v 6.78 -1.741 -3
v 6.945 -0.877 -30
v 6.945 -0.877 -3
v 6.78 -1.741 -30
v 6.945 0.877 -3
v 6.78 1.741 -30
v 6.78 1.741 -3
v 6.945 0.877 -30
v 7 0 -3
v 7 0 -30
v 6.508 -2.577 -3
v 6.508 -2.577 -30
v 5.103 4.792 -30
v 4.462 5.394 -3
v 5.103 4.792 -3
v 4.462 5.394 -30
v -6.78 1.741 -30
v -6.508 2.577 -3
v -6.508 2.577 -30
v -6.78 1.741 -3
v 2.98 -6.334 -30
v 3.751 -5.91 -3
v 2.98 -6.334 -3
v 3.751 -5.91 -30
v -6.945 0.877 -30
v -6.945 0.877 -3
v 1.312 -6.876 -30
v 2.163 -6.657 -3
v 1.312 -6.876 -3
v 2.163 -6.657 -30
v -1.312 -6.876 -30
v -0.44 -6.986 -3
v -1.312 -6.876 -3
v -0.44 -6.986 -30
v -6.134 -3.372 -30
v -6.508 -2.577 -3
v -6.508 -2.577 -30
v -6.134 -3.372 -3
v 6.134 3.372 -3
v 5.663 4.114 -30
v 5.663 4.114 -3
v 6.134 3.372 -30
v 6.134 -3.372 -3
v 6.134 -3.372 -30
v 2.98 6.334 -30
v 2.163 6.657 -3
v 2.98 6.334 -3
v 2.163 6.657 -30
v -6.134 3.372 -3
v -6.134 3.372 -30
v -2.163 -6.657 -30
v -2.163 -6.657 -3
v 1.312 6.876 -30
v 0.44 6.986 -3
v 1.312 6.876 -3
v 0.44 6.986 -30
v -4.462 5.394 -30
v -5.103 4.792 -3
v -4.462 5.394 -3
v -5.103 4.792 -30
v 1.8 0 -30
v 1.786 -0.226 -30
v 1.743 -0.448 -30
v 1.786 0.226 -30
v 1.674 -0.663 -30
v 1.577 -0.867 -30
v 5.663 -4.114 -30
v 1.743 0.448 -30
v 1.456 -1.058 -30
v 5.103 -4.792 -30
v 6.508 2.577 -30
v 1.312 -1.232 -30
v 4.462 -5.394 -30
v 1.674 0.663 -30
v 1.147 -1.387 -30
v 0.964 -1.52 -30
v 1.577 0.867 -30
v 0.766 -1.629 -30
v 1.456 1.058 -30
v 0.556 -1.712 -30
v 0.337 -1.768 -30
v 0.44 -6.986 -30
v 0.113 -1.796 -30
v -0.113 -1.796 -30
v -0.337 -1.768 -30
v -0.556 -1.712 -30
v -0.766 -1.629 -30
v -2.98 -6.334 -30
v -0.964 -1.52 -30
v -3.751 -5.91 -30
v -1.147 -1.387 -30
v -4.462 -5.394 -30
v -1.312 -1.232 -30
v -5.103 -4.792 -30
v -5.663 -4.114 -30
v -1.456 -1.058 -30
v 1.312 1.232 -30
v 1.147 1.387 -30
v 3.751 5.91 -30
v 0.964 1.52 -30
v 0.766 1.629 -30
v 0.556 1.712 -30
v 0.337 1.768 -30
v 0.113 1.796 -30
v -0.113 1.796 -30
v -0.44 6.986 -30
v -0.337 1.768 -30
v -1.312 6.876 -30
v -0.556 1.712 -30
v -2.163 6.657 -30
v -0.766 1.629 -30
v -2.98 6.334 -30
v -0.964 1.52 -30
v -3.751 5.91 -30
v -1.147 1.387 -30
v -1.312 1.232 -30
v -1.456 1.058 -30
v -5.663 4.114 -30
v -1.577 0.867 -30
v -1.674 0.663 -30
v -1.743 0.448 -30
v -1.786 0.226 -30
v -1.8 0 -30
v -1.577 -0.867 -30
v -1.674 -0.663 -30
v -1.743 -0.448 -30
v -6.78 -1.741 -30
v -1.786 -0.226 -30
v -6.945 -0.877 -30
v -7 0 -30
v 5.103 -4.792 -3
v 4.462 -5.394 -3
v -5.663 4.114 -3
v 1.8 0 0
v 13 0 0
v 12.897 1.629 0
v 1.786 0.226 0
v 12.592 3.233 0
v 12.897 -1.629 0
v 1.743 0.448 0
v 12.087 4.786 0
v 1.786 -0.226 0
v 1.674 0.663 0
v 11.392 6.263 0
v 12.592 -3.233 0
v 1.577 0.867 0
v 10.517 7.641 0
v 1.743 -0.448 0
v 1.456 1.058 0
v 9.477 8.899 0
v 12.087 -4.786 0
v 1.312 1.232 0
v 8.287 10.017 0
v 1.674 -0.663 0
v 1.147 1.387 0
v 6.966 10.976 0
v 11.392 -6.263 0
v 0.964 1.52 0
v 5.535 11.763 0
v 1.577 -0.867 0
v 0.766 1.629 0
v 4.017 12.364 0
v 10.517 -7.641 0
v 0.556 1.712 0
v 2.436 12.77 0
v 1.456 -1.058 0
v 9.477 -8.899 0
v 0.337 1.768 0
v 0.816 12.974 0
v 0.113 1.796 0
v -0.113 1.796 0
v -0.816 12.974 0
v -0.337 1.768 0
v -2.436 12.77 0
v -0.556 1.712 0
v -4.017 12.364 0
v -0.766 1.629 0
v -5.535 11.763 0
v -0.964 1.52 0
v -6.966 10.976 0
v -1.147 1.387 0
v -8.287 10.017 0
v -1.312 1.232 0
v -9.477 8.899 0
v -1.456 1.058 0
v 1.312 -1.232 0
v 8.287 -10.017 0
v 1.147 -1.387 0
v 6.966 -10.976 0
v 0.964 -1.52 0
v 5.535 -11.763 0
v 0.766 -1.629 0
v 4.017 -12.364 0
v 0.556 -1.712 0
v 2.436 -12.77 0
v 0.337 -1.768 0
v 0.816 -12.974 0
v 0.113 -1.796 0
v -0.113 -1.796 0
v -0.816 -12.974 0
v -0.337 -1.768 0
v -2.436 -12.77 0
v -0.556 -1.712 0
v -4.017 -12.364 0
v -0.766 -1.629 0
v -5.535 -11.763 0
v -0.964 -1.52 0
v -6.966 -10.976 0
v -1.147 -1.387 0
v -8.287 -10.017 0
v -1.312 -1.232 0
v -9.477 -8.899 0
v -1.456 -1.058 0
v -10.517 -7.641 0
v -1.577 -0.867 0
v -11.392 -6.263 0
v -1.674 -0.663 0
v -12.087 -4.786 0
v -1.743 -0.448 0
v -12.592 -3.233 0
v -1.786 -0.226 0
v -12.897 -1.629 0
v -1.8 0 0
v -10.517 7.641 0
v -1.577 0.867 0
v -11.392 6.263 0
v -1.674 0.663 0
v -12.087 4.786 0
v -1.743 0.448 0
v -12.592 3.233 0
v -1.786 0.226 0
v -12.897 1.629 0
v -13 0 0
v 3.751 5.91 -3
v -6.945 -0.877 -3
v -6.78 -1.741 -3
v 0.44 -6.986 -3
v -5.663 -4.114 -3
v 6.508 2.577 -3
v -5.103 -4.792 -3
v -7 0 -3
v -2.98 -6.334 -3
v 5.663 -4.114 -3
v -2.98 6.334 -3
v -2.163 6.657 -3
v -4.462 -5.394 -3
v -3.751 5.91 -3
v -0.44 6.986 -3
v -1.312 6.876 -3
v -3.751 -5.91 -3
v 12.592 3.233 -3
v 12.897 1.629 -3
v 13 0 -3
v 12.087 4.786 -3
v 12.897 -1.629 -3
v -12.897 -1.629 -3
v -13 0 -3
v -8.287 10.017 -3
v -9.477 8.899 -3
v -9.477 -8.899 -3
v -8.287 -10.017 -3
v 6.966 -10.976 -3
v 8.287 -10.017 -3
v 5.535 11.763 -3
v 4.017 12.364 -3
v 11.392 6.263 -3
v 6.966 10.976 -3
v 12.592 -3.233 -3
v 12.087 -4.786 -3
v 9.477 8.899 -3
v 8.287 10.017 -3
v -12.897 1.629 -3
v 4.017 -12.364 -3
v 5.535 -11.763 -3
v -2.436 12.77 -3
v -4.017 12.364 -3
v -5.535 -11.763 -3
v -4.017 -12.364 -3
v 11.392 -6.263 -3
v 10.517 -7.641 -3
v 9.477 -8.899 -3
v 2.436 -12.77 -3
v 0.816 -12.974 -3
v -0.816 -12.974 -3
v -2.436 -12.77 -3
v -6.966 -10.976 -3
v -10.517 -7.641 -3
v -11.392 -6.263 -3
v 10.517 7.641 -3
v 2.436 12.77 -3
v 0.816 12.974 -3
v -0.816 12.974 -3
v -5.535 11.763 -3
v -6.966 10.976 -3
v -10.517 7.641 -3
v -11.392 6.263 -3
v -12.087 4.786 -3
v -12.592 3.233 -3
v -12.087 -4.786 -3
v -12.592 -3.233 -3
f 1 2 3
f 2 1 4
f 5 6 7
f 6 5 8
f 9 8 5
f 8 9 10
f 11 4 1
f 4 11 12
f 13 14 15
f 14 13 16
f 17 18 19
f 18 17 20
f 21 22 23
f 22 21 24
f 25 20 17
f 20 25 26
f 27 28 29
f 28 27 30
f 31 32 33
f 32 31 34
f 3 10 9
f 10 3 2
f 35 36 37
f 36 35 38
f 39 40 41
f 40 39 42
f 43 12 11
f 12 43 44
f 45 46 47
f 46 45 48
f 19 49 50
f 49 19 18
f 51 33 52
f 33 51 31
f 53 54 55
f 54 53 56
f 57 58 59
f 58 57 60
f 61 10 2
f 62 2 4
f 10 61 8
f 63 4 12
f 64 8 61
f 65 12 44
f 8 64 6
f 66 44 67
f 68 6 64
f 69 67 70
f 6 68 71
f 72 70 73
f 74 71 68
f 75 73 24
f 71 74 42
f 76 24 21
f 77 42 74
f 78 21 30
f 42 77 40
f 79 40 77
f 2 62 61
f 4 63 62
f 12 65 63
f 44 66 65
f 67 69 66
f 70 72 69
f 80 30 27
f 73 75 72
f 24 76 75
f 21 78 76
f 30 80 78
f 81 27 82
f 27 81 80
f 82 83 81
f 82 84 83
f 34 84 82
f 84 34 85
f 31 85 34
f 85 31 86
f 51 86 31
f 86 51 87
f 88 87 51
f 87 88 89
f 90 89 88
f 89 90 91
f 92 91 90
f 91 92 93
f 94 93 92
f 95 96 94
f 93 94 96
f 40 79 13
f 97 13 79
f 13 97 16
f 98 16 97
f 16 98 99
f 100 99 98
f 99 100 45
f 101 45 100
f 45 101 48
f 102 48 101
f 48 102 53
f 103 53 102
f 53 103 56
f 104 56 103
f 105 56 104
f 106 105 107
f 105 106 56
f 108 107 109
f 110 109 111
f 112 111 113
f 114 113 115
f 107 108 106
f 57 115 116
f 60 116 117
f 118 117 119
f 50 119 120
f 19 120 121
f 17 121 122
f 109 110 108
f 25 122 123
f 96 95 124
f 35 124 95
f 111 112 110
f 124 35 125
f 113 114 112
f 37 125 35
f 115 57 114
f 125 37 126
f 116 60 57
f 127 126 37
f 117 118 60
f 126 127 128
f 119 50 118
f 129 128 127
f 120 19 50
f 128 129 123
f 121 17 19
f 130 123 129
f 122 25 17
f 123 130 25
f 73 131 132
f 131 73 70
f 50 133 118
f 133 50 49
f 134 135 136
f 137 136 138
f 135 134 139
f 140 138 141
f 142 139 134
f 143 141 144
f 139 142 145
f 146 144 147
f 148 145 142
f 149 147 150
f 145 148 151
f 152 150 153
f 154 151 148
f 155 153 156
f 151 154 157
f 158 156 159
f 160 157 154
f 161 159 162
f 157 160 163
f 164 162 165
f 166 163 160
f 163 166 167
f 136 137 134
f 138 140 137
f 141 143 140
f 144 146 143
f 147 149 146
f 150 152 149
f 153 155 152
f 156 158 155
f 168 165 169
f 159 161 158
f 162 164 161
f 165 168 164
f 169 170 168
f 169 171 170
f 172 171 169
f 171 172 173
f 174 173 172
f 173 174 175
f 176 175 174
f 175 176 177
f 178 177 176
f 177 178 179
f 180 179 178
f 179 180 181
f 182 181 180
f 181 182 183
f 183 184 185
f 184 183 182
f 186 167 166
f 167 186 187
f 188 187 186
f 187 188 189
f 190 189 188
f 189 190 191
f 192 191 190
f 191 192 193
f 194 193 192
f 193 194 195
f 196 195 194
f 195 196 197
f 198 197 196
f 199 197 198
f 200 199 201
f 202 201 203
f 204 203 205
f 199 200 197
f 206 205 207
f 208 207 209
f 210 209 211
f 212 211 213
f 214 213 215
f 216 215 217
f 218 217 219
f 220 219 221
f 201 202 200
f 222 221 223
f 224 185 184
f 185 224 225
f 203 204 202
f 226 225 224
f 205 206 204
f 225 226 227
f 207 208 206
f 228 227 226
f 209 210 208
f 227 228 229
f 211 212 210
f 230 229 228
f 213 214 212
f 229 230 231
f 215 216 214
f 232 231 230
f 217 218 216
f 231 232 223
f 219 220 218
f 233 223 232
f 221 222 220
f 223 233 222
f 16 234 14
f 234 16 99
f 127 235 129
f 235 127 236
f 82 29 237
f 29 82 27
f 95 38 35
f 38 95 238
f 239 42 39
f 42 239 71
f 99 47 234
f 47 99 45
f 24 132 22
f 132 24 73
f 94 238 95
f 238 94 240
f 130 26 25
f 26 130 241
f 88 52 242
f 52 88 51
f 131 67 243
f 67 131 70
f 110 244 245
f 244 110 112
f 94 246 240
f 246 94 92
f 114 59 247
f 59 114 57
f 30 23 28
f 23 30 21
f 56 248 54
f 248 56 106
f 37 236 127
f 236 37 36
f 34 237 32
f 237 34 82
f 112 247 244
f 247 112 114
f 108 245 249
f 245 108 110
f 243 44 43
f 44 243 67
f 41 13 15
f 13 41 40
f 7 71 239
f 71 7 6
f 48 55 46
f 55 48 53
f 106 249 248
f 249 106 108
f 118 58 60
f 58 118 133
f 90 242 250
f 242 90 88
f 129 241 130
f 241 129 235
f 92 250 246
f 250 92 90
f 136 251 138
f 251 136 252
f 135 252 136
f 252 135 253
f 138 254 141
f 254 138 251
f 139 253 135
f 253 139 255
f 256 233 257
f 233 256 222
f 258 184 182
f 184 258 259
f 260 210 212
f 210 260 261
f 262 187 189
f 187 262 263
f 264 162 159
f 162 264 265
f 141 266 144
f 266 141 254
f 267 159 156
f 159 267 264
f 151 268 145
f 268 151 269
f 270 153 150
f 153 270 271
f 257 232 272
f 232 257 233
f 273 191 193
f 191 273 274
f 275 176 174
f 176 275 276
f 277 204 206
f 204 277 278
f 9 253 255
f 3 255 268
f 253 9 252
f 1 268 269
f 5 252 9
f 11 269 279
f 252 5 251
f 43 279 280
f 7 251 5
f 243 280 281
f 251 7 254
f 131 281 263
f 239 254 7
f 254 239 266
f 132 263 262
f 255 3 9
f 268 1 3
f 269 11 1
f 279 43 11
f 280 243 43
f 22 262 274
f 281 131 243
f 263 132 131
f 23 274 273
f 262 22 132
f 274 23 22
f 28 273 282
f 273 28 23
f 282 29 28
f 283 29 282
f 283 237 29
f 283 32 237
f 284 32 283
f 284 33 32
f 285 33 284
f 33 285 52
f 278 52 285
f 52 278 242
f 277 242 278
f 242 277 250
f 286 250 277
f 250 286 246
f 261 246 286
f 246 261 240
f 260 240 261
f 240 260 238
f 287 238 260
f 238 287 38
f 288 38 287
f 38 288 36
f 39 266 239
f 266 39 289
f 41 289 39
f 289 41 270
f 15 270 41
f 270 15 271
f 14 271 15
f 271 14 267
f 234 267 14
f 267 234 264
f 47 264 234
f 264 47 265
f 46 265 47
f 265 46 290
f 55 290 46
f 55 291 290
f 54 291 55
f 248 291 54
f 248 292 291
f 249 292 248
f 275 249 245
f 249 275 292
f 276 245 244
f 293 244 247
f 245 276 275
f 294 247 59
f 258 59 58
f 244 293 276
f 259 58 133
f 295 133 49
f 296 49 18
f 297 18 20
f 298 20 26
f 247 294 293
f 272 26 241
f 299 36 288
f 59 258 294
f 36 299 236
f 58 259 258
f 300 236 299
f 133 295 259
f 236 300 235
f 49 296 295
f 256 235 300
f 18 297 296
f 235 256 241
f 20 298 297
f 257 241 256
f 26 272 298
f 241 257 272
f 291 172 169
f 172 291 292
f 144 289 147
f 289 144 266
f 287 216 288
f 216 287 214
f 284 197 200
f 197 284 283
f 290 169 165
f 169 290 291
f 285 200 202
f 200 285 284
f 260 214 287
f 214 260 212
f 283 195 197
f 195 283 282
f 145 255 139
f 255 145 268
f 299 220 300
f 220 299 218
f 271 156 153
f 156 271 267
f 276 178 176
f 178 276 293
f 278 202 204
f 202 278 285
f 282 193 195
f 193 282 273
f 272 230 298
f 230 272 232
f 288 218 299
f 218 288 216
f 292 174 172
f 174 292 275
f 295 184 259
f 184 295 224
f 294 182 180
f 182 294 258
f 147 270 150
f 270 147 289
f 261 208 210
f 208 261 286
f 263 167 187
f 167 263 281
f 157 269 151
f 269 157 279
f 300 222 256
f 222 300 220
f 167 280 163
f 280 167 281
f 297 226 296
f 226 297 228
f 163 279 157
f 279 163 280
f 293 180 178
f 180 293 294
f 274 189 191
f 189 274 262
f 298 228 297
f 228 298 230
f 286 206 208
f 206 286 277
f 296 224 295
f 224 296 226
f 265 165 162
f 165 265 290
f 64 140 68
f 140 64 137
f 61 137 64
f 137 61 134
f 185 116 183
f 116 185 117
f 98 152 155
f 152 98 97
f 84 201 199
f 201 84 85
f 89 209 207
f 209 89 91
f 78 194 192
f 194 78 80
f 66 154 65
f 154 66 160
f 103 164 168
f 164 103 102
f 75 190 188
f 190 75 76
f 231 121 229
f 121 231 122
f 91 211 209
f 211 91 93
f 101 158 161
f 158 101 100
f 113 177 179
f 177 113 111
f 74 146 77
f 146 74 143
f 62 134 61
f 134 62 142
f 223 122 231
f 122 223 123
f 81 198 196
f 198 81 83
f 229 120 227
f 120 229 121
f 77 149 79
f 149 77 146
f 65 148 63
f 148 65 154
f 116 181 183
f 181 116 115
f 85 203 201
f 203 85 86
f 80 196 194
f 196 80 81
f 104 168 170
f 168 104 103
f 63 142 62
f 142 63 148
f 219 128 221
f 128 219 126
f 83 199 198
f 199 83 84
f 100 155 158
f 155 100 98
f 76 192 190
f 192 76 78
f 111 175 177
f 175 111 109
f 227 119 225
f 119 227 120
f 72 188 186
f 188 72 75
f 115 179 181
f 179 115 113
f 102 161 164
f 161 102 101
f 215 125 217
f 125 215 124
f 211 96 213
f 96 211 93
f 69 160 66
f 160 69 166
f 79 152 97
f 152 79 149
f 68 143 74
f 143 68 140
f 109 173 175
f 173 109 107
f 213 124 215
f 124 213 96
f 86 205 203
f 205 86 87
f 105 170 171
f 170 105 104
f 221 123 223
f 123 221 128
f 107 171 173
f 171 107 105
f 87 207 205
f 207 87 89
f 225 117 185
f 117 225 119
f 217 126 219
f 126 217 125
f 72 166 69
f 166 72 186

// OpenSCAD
$fn = 50;


difference() {
	union() {
		translate(v = [0, 0, -30.0000000000]) {
			cylinder(h = 30, r = 7.0000000000);
		}
		translate(v = [0, 0, -3.0000000000]) {
			cylinder(h = 3, r = 13.0000000000);
		}
	}
	union() {
		#translate(v = [0, 0, -30]) {
			cylinder(h = 30, r = 1.8000000000);
		}
	}
}
